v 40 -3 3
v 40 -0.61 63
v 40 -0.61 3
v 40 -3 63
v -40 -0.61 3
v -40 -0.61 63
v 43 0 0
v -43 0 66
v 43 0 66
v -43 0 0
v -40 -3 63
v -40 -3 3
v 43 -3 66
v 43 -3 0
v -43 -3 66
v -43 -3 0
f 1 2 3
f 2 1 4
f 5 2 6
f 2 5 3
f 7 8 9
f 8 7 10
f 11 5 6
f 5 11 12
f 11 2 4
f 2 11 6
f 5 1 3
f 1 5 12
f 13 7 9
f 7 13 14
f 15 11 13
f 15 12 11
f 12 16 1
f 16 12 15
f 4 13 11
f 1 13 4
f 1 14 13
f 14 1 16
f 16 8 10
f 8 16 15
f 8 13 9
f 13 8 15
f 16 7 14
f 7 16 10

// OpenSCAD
// @checkpoint parent= desc="Litofanía o relieve con surface() a partir de un mapa de alturas"
// Receta de la skill openscad-from-image: usa el .dat que deja image_to_heightmap
// en refs/. Copia aquí lo que devolvió la herramienta (`columns`, `rows`, `sizeMm`).
// Litofanía: pide el mapa con invert=true (oscuro = grueso), imprímela de pie y
// ponle una luz detrás. Relieve: sin invert (claro = alto).

/* [Mapa de alturas] */
map_file = "refs/photo-heightmap.dat";
// Columnas y filas del mapa (`columns` y `rows` del resultado)
cols = 200;     // [2:1:500]
rows = 150;     // [2:1:500]
// Tamaño de la pieza en mm (`sizeMm.width` y `sizeMm.height`)
width = 80;     // [10:1:300]
depth = 60;     // [10:1:300]

/* [Espesores] */
base = 0.6;     // [0.4:0.1:3] espesor donde el mapa vale 0 (lo más fino de una litofanía)
relief = 2.4;   // [0.4:0.2:20] cuánto sube el mapa sobre la base (valor 100)

/* [Marco y posición] */
frame = true;
frame_w = 3;    // [0:0.5:15]
// Una litofanía se imprime de pie, con la cara hacia el frente
stand_up = true;
piece_color = "white";

/* [Hidden] */
eps = 0.01;

sx = width / (cols - 1);
sy = depth / (rows - 1);
sz = relief / 100;

// surface() baja un punto por debajo del mínimo del mapa: se recorta a z >= 0.
module relief_body() {
    intersection() {
        union() {
            translate([0, 0, base]) scale([sx, sy, sz]) surface(file = map_file, center = true);
            translate([-width / 2, -depth / 2, 0]) cube([width, depth, base + eps]);
        }
        translate([-width / 2, -depth / 2, 0]) cube([width, depth, base + relief + 1]);
    }
}

module piece() {
    relief_body();
    if (frame && frame_w > 0)
        difference() {
            translate([-width / 2 - frame_w, -depth / 2 - frame_w, 0])
                cube([width + 2 * frame_w, depth + 2 * frame_w, base + relief]);
            translate([-width / 2, -depth / 2, -1])
                cube([width, depth, base + relief + 2]);
        }
}

color(piece_color)
    if (stand_up)
        // El eje Y del mapa pasa a ser el alto; apoyada en z = 0.
        translate([0, 0, depth / 2 + (frame ? frame_w : 0)]) rotate([90, 0, 0]) piece();
    else
        piece();
